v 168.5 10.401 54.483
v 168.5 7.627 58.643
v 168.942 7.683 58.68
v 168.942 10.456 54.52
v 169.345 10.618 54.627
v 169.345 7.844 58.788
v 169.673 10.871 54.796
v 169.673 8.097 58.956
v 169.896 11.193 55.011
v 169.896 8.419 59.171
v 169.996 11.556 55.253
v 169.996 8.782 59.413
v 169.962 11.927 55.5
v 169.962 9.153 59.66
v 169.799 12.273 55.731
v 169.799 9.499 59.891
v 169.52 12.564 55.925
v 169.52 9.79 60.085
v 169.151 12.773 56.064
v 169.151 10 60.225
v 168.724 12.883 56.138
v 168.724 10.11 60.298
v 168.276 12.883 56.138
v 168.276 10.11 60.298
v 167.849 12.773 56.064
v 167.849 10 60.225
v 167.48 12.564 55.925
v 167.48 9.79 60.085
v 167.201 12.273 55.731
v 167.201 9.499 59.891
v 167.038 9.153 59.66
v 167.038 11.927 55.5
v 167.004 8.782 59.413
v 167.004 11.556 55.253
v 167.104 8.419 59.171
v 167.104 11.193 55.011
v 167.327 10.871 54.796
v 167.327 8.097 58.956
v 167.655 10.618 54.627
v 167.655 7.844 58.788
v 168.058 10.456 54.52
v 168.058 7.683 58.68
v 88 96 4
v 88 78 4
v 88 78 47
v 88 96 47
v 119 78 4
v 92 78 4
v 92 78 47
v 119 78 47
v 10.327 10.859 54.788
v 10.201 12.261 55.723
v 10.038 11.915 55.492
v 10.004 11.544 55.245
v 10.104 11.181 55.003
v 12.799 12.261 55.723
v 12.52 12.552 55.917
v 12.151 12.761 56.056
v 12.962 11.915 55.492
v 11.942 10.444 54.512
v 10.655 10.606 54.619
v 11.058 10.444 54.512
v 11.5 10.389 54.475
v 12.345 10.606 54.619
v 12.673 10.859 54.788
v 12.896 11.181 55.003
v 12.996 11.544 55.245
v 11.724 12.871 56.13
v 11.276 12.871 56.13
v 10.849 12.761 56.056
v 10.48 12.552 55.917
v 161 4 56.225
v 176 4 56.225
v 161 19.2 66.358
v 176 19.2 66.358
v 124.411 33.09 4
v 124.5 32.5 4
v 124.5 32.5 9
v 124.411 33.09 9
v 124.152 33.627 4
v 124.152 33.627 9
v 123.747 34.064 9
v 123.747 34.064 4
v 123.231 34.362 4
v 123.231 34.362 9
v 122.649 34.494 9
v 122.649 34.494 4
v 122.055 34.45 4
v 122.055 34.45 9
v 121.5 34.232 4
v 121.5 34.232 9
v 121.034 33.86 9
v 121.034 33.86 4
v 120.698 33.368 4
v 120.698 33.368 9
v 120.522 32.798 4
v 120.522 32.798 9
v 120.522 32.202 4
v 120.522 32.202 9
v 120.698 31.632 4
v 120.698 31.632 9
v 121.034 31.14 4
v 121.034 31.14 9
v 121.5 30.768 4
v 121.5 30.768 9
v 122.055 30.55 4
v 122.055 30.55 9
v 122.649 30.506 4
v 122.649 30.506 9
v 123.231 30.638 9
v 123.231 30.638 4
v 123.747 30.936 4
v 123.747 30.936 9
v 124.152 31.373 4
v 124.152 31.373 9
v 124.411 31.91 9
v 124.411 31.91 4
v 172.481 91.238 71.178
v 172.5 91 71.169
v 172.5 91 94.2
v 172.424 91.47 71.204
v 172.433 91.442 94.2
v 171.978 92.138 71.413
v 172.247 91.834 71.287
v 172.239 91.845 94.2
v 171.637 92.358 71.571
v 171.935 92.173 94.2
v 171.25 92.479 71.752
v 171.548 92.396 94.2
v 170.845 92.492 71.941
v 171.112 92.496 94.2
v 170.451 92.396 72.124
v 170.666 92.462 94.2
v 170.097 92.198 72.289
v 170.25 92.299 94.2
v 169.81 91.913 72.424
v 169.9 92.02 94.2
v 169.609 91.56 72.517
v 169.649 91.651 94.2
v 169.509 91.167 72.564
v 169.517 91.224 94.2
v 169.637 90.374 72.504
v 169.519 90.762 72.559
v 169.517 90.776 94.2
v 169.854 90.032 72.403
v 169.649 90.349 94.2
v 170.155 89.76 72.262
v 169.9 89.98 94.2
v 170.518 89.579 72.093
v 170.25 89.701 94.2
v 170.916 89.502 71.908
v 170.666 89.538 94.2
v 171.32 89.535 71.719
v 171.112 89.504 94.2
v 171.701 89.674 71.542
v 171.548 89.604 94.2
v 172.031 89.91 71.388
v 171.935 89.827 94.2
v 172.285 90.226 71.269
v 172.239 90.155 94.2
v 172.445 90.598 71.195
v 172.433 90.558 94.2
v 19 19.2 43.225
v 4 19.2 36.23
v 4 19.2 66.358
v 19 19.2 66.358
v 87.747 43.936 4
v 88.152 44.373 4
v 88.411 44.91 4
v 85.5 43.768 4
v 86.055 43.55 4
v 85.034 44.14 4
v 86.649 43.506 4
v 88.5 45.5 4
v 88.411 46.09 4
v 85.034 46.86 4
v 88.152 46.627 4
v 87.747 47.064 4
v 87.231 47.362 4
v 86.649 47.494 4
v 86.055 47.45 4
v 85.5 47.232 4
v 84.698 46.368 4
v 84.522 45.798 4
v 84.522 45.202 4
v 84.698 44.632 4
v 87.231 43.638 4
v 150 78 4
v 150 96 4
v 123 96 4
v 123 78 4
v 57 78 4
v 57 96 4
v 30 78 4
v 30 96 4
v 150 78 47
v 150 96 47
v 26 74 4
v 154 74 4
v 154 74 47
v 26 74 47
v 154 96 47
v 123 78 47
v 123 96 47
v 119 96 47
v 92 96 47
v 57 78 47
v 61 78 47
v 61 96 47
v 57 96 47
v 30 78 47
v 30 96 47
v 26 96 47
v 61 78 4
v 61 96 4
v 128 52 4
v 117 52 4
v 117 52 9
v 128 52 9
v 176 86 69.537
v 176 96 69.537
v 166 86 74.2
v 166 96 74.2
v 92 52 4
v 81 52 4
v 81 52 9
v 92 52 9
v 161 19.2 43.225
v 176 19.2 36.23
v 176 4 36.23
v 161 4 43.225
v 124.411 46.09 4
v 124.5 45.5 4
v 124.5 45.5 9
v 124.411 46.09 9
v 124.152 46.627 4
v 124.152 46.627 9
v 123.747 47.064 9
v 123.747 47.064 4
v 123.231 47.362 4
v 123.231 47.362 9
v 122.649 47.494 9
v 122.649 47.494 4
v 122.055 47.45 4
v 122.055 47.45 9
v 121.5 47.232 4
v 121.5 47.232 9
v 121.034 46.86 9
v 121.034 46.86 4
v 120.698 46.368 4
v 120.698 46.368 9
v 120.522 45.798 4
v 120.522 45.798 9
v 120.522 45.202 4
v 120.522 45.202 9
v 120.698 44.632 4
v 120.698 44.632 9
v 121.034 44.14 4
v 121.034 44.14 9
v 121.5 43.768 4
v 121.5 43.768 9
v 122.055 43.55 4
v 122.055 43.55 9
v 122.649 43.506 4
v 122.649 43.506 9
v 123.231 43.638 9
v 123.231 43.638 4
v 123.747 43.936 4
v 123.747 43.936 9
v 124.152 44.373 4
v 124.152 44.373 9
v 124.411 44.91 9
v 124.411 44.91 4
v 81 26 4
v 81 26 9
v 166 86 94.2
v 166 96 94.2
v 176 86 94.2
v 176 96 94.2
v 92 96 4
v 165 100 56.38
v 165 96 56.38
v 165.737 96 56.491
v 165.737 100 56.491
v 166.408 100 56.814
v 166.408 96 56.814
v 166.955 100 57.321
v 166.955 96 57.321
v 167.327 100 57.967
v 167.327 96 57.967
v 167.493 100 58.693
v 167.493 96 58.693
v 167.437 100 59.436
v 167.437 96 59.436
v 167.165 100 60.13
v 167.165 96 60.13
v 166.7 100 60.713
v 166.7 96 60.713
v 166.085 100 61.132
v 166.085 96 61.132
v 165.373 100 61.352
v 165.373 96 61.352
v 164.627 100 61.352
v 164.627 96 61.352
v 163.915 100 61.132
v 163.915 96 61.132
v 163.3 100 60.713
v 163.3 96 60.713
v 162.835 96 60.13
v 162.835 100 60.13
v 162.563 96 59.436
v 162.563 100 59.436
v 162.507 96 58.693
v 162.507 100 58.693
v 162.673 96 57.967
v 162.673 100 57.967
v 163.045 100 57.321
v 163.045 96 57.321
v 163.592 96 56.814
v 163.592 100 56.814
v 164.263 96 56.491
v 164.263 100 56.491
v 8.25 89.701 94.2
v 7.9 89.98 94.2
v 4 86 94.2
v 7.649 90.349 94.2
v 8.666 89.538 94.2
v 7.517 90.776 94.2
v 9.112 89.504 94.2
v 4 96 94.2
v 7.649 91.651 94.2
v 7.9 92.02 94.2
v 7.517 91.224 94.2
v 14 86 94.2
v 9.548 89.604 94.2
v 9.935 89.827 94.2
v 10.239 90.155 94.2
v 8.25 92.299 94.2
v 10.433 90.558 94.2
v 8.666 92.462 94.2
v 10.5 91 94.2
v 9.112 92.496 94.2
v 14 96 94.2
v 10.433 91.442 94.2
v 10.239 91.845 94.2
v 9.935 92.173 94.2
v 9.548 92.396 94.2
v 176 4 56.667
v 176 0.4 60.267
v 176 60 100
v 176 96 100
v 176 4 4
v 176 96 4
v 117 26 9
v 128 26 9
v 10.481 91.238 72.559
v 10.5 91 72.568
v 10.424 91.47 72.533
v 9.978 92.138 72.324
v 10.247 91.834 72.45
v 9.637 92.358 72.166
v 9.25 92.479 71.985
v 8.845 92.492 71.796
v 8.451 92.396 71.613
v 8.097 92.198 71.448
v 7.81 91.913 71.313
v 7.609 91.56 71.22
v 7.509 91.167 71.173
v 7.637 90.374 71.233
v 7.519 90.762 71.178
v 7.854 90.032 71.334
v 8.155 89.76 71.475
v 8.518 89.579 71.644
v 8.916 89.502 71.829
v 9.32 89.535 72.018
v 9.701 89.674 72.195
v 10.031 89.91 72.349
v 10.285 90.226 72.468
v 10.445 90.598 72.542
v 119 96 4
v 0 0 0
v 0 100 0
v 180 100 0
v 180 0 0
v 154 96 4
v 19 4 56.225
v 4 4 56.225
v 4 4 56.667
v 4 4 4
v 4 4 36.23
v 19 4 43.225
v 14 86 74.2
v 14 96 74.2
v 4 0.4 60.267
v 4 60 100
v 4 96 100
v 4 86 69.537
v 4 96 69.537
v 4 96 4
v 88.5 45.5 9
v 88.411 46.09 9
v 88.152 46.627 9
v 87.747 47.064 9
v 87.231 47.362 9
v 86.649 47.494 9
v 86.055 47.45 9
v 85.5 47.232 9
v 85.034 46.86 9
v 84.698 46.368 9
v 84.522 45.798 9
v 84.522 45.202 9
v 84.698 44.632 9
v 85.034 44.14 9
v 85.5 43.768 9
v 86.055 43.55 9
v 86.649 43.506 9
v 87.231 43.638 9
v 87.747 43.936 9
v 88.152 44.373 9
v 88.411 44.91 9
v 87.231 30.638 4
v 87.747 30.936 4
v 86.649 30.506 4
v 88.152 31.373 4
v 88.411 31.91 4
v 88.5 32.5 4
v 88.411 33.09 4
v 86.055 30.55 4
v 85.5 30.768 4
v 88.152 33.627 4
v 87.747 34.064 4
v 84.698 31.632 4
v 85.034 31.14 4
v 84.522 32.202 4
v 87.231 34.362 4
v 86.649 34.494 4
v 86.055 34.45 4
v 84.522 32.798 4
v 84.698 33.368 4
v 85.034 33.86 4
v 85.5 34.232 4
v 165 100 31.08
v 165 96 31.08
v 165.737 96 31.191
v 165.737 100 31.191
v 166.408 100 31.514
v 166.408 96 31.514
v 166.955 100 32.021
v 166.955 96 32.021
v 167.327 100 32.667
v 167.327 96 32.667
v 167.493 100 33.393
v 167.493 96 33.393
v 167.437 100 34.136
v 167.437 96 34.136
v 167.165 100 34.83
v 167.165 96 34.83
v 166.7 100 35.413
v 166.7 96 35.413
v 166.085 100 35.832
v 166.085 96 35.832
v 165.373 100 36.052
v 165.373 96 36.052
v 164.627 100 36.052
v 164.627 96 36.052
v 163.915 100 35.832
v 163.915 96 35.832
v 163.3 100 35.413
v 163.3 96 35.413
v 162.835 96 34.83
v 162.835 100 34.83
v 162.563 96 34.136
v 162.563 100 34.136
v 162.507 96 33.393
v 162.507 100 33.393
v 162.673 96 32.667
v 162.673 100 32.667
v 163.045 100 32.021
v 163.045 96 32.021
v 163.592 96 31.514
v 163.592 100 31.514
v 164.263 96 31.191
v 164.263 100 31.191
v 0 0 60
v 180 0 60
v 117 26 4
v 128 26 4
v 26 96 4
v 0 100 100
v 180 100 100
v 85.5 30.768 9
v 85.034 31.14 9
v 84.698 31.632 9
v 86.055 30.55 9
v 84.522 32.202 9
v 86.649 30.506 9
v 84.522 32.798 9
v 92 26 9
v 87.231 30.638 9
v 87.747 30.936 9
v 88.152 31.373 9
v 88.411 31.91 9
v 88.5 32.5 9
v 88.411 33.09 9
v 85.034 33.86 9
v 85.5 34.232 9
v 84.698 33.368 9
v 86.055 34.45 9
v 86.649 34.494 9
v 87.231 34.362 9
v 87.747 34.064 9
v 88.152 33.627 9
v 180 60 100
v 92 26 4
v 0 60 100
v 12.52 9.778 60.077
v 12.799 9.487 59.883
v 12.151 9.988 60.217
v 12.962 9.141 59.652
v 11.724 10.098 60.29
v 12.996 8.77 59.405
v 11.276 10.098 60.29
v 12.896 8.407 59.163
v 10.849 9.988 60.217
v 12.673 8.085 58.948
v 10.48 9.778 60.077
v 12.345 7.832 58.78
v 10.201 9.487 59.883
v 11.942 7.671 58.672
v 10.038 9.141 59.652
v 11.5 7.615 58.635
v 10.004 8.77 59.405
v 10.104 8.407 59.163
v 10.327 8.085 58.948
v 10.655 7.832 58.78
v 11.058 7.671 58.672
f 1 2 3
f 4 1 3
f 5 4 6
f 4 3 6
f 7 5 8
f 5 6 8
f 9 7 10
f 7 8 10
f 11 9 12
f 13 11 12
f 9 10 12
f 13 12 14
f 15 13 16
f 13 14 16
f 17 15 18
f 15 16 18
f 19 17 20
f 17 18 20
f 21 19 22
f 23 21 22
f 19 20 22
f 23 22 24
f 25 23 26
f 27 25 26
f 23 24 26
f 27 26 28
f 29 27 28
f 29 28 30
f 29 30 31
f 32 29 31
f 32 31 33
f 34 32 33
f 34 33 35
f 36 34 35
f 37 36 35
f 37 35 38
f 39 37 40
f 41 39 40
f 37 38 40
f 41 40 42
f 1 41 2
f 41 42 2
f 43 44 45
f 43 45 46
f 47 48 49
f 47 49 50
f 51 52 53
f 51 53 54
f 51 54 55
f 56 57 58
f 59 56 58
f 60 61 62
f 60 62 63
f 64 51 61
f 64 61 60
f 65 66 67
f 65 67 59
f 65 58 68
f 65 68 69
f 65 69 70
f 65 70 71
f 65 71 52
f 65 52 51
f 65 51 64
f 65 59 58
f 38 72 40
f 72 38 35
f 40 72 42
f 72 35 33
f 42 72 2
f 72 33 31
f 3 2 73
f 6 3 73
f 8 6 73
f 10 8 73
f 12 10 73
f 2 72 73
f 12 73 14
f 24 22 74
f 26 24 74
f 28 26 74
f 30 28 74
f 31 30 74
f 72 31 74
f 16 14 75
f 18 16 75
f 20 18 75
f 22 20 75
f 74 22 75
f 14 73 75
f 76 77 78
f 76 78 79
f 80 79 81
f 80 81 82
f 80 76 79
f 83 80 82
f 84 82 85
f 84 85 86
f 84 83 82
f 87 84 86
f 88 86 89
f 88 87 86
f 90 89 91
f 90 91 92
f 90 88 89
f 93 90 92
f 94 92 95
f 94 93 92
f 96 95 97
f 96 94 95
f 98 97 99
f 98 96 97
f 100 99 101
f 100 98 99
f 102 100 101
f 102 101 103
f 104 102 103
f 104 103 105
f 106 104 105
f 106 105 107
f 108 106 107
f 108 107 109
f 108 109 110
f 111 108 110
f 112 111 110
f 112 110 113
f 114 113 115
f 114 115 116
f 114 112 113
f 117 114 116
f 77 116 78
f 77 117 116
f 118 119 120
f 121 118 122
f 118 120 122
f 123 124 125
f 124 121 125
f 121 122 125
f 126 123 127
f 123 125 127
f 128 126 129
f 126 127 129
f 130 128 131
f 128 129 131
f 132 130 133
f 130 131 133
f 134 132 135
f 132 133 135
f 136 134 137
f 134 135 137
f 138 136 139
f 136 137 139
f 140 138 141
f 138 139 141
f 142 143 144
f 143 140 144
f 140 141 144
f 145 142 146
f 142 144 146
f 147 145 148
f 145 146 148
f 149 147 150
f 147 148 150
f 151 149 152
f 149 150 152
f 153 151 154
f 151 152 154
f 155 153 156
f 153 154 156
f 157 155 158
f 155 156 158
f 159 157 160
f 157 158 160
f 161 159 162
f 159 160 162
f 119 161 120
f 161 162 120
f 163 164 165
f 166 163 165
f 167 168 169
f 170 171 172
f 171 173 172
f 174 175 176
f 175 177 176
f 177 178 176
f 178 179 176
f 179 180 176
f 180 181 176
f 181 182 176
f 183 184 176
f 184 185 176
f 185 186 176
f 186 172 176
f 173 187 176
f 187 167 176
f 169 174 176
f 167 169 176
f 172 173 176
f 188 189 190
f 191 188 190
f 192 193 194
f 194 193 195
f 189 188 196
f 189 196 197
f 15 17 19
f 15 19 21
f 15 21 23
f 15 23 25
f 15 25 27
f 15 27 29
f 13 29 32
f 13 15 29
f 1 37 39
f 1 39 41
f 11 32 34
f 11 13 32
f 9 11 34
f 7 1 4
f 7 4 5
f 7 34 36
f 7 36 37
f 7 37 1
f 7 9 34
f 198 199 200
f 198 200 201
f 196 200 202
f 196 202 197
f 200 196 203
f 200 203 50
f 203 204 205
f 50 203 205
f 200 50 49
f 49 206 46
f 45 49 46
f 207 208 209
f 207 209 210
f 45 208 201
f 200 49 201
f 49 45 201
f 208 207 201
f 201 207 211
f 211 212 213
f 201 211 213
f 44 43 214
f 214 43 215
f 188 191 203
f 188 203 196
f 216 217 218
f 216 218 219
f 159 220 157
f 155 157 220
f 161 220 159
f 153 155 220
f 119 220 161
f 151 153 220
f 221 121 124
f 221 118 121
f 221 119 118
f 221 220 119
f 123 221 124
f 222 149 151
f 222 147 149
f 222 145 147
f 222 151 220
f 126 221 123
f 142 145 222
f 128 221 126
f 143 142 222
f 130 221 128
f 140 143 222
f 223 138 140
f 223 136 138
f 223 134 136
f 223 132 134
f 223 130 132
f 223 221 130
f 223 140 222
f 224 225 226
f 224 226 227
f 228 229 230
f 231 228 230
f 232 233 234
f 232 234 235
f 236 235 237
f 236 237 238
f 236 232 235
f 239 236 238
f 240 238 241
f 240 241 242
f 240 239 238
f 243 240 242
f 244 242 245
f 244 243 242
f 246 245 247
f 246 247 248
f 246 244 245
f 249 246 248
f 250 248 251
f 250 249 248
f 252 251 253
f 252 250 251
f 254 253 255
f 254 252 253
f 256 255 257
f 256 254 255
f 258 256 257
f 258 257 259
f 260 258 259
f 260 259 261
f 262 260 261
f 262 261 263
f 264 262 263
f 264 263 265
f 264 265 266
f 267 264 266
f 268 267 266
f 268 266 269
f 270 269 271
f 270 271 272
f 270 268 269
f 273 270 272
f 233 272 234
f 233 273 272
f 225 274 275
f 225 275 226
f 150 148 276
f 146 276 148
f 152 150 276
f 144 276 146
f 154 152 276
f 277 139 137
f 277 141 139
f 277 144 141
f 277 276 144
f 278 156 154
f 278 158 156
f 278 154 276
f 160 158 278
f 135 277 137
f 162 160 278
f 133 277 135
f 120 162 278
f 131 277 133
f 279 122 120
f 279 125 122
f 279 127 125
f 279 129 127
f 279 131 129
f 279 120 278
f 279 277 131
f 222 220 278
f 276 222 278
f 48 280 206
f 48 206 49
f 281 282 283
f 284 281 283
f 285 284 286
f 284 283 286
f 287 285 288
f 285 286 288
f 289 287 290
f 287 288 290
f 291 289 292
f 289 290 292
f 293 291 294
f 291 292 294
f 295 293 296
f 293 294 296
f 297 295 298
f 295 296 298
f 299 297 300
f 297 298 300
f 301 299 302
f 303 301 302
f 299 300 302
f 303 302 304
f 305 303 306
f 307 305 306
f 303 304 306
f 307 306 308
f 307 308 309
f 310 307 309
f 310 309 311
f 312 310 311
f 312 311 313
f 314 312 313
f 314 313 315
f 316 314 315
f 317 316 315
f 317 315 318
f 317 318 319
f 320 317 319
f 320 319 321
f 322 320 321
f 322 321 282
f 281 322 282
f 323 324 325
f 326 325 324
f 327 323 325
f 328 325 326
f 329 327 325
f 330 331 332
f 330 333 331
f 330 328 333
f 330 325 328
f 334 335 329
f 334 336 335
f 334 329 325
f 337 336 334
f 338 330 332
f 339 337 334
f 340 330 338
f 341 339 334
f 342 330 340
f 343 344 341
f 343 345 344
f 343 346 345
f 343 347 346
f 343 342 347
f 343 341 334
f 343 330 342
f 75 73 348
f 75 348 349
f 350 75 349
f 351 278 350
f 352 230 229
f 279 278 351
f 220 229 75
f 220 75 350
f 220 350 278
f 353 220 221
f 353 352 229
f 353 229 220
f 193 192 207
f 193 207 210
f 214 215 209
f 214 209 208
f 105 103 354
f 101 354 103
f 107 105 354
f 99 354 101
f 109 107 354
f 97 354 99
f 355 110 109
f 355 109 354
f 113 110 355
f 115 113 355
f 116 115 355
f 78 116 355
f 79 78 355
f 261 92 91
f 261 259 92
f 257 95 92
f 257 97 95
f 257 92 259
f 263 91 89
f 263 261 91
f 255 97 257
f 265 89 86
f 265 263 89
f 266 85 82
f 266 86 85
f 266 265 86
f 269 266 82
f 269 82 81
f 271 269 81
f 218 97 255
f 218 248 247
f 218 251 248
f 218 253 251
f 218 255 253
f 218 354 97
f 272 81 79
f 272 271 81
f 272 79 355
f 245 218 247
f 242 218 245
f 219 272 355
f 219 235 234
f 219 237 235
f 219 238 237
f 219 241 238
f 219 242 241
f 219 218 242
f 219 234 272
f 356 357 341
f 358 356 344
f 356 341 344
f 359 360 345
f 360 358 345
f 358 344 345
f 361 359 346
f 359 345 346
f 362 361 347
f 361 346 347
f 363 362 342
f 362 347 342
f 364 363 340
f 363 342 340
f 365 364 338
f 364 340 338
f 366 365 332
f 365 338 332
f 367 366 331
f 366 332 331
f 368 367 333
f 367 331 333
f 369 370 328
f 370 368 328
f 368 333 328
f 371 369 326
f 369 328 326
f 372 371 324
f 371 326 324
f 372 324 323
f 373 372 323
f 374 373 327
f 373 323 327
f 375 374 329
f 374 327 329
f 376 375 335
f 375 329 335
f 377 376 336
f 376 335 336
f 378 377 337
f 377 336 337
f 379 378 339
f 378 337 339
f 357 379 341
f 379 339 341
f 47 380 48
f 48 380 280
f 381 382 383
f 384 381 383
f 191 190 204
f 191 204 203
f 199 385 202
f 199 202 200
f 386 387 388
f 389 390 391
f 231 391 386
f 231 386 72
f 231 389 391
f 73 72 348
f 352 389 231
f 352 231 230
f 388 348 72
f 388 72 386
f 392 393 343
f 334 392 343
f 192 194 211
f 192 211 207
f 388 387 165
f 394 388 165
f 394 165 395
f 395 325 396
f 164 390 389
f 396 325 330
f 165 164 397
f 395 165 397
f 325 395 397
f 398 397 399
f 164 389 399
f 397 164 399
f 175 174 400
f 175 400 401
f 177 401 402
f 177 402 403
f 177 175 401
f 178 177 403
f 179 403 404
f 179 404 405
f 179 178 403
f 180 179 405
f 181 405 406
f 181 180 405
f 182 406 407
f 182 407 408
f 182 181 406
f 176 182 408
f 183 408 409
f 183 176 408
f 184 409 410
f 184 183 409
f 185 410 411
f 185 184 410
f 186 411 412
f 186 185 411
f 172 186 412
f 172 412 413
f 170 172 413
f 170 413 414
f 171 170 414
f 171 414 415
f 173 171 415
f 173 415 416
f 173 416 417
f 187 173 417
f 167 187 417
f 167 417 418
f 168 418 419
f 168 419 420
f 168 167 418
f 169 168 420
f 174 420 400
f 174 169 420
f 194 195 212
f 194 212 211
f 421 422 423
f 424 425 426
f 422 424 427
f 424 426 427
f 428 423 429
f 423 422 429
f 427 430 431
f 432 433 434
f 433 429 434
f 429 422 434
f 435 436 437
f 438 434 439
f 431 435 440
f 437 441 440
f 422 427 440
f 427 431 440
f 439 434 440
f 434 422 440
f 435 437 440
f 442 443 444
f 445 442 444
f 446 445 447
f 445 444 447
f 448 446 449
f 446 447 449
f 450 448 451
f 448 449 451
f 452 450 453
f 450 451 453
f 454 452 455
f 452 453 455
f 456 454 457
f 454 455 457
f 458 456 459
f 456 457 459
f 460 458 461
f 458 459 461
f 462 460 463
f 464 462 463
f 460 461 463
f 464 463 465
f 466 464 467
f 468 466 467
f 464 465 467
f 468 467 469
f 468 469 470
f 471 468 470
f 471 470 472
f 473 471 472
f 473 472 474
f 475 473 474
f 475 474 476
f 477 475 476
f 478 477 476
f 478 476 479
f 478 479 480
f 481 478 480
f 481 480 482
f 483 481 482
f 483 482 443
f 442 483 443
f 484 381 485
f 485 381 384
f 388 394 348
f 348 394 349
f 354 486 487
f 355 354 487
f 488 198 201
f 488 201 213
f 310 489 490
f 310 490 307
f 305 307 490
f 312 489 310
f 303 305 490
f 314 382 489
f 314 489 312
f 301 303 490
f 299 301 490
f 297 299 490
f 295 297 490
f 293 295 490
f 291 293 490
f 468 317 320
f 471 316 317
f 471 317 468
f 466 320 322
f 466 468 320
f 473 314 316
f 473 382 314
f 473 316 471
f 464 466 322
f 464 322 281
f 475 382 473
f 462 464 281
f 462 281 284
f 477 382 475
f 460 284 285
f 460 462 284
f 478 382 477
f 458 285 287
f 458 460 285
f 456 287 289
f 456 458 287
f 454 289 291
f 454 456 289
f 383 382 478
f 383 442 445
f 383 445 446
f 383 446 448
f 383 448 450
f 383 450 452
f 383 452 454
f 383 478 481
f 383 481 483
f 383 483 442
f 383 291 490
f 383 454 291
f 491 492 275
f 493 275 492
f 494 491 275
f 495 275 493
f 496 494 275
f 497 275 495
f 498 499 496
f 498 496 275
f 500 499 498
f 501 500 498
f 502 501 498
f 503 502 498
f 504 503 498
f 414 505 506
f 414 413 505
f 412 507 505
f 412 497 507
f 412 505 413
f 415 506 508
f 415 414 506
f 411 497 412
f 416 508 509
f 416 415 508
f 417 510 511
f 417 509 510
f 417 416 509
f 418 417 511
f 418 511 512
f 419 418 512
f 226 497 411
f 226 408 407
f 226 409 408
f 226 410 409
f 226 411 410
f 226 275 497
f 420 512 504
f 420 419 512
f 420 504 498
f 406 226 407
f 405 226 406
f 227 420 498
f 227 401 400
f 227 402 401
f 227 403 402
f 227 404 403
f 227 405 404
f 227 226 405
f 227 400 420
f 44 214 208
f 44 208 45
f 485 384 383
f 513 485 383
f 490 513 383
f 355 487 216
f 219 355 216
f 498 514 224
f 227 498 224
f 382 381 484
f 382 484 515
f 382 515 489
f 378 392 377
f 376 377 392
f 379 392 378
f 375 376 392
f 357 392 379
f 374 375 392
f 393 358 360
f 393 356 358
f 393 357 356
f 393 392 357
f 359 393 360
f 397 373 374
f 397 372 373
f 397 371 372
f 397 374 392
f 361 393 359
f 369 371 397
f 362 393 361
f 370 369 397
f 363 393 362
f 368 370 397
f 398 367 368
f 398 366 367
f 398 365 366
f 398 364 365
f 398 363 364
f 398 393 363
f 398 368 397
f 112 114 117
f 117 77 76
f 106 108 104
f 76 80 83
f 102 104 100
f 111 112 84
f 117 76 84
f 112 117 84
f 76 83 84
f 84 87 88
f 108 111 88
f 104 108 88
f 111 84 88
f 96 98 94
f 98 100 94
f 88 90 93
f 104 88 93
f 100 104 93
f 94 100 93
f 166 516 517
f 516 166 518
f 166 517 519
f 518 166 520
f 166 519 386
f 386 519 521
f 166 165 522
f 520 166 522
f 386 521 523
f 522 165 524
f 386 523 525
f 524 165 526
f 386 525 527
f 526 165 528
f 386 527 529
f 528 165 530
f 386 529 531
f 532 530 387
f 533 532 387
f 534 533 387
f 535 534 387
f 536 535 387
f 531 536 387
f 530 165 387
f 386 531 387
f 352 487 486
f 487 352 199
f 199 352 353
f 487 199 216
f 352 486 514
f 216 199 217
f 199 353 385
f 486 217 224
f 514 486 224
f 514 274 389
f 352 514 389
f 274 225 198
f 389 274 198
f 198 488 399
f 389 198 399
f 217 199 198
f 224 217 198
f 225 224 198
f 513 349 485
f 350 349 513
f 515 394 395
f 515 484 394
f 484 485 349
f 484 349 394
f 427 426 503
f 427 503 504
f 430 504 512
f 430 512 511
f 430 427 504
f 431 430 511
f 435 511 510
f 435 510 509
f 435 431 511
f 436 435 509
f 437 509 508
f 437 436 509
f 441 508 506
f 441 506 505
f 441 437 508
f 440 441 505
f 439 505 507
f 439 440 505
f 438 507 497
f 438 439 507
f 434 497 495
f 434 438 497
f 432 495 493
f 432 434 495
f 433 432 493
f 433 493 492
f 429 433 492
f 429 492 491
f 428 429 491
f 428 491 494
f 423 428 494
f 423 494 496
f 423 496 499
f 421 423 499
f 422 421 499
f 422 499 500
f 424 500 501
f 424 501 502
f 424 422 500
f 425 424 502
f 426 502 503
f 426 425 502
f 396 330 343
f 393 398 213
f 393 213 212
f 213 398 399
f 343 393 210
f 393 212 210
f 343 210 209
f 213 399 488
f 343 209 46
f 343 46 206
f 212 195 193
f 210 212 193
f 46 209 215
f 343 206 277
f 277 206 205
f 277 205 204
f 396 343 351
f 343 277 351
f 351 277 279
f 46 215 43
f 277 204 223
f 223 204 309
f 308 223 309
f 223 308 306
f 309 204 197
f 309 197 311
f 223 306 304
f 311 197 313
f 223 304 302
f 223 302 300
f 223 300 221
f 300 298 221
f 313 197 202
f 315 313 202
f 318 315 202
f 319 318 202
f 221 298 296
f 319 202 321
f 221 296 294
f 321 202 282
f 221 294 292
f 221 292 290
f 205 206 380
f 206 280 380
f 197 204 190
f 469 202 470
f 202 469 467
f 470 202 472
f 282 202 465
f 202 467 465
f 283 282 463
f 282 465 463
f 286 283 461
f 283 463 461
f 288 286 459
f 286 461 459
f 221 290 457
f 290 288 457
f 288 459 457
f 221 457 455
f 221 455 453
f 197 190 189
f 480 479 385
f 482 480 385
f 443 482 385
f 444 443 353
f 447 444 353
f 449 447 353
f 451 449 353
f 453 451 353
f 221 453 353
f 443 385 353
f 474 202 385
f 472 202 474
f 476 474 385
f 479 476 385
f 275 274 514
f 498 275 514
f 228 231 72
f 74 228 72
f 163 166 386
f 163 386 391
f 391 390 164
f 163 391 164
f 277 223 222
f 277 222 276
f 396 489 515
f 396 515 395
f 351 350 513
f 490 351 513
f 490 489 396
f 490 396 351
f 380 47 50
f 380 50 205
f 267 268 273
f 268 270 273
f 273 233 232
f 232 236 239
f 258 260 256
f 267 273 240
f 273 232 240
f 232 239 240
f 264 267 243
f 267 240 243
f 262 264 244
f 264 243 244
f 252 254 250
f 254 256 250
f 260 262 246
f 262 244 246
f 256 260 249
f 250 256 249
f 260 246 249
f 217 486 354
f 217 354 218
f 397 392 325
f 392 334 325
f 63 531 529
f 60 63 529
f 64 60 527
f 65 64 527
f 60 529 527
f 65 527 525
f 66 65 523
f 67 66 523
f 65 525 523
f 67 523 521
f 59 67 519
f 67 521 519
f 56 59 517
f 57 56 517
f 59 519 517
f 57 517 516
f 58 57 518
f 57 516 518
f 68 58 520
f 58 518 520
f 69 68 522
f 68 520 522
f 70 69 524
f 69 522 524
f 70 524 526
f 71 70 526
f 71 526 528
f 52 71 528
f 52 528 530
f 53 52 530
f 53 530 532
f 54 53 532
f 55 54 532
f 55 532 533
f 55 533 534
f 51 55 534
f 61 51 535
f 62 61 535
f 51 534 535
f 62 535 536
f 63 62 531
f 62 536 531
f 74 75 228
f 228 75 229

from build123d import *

# Parameters (mm, degrees)
ESBO_O1_W                = 180
ESBO_O1_H                = 100
ESBO_O1_W_2              = 172
ESBO_O1_H_2              = 92
RESSALTO_EXTRUS_O1_DEPTH = 100
ESBO_O2_W                = 180
ESBO_O2_H                = 100
RESSALTO_EXTRUS_O2_DEPTH = 4
RESSALTO_EXTRUS_O3_DEPTH = 43
CORTE_EXTRUS_O1_DEPTH    = 263
CHANFRO1_SIZE            = 6
CHANFRO1_SIZE2           = 4.326661531
ESBO_O5_W                = 10
ESBO_O5_H                = 20
RESSALTO_EXTRUS_O4_DEPTH = 10
ESBO_O6_R                = 1.5
CORTE_EXTRUS_O2_DEPTH    = 32
ESBO_O7_R                = 2.5
CORTE_EXTRUS_O3_DEPTH    = 32
CHANFRO3_SIZE            = 4.663076582
CHANFRO3_SIZE_2          = 10
CHANFRO4_SIZE            = 10
CHANFRO4_SIZE_2          = 4.663076582
RESSALTO_EXTRUS_O5_DEPTH = 15
RESSALTO_EXTRUS_O6_DEPTH = 15
CHANFRO5_SIZE2           = 15
CHANFRO5_SIZE            = 6.994614872
CHANFRO6_SIZE2           = 15
CHANFRO6_SIZE            = 6.994614872
ESBO_O10_R               = 1.5
CORTE_EXTRUS_O4_DEPTH    = 5
ESBO_O11_W               = 11
ESBO_O11_H               = 26
ESBO_O11_R               = 2
RESSALTO_EXTRUS_O7_DEPTH = 5


# Some blends are built 0.0001 mm under size
with BuildPart() as part:
    # Esboço1 → Ressalto-extrusão1 (new body)
    with BuildSketch(Plane.XY):
        with Locations((90, 50)):
            Rectangle(ESBO_O1_W, ESBO_O1_H)
        with Locations((90, 50)):
            Rectangle(ESBO_O1_W_2, ESBO_O1_H_2, mode=Mode.SUBTRACT)
    extrude(amount=RESSALTO_EXTRUS_O1_DEPTH)

    # Esboço2 → Ressalto-extrusão2 (add)
    with BuildSketch(Plane(origin=(0, 0, 0), x_dir=(-1, 0, 0), z_dir=(0, 0, -1))):
        with Locations((-90, 50)):
            Rectangle(ESBO_O2_W, ESBO_O2_H)
    extrude(amount=-RESSALTO_EXTRUS_O2_DEPTH)

    # Esboço3 → Ressalto-extrusão3 (add)
    with BuildSketch(Plane.XY.offset(4)):
        Polygon((30, 96), (30, 78), (57, 78), (57, 96), (61, 96), (61, 78), (88, 78), (88, 96), (92, 96), (92, 78), (119, 78), (119, 96), (123, 96), (123, 78), (150, 78), (150, 96), (154, 96), (154, 74), (26, 74), (26, 96), align=None)
    extrude(amount=RESSALTO_EXTRUS_O3_DEPTH)

    # Esboço4 → Corte-extrusão1 (cut)
    with BuildSketch(Plane.ZY):
        Polygon((60, 0), (100, 60), (100, 0), align=None)
    extrude(amount=-CORTE_EXTRUS_O1_DEPTH, mode=Mode.SUBTRACT)

    # Chanfro1
    chanfro1_edges = [part.edges().sort_by_distance(p)[0] for p in [
        (90, 4, 62.666666667),
    ]]
    chanfro1_side = [part.faces().sort_by_distance(p)[0] for p in [
        (90, 4, 33.333333333),
    ]]
    chamfer(chanfro1_edges, length=CHANFRO1_SIZE, length2=CHANFRO1_SIZE2, reference=chanfro1_side[0])

    # Esboço5 → Ressalto-extrusão4 (add)
    with BuildSketch(Plane.XZ.offset(-96)):
        with Locations((9, 84.2)):
            Rectangle(ESBO_O5_W, ESBO_O5_H)
        with Locations((171, 84.2)):
            Rectangle(ESBO_O5_W, ESBO_O5_H)
    extrude(amount=RESSALTO_EXTRUS_O4_DEPTH)

    # Esboço6 → Corte-extrusão2 (cut)
    with BuildSketch(Plane.XY.offset(94.2)):
        with Locations((171, 91)):
            Circle(ESBO_O6_R)
        with Locations((9, 91)):
            Circle(ESBO_O6_R)
    extrude(amount=-CORTE_EXTRUS_O2_DEPTH, mode=Mode.SUBTRACT)

    # Esboço7 → Corte-extrusão3 (cut)
    with BuildSketch(Plane.XZ.offset(-96)):
        with Locations(Location((165, 58.88, 0), (0, 0, 270))):
            Circle(ESBO_O7_R)
        with Locations(Location((165, 33.58, 0), (0, 0, 270))):
            Circle(ESBO_O7_R)
    extrude(amount=-CORTE_EXTRUS_O3_DEPTH, mode=Mode.SUBTRACT)

    # Chanfro3
    # the kernel refuses this chamfer: 10, 4.663076582 mm, written as the material it adds along each edge
    with BuildSketch(Plane(origin=(176, 96, 74.2), x_dir=(0.07481330637059742, 0, -0.9971975577536776), z_dir=(0, -1, 0))) as chanfro3_piece_1_section:
        Polygon((CHANFRO3_SIZE * 0.997197557657, -CHANFRO3_SIZE * 0.0748133063634), (-CHANFRO3_SIZE_2 * 0.0748133063706, -CHANFRO3_SIZE_2 * 0.997197557754), (0, 0), align=None)
    chanfro3_piece_1 = extrude(amount=10, mode=Mode.PRIVATE)
    chanfro3_piece_1 = split(chanfro3_piece_1, bisect_by=Plane(origin=(166, 91.000000816, 72.695597538), z_dir=(1, 0, 0)), keep=Keep.TOP, mode=Mode.PRIVATE)
    chanfro3_piece_1 = chanfro3_piece_1 - Plane(origin=(171, 91, 72.695597538), x_dir=(1, 0, 0), z_dir=(0, 0, 1)) * Cylinder(1.5, 60, mode=Mode.PRIVATE)
    add(chanfro3_piece_1)

    # Chanfro4
    # the kernel refuses this chamfer: 10, 4.663076582 mm, written as the material it adds along each edge
    with BuildSketch(Plane(origin=(4, 96, 74.2), x_dir=(0.9998669641130704, 0, 0.01631116413111014), z_dir=(0, -1, 0))) as chanfro4_piece_1_section:
        Polygon((CHANFRO4_SIZE * 0.999866964113, -CHANFRO4_SIZE * 0.0163111641311), (-CHANFRO4_SIZE_2 * 0.0163111641295, -CHANFRO4_SIZE_2 * 0.999866964017), (0, 0), align=None)
    chanfro4_piece_1 = extrude(amount=10, mode=Mode.PRIVATE)
    chanfro4_piece_1 = chanfro4_piece_1 - Plane(origin=(9, 91, 72.695597727), x_dir=(1, 0, 0), z_dir=(0, 0, 1)) * Cylinder(1.5, 60, mode=Mode.PRIVATE)
    chanfro4_piece_1 = split(chanfro4_piece_1, bisect_by=Plane(origin=(14, 91.000000829, 72.695597727), z_dir=(-1, 0, 0)), keep=Keep.TOP, mode=Mode.PRIVATE)
    add(chanfro4_piece_1)

    # Esboço8 → Ressalto-extrusão5 (add)
    with BuildSketch(Plane.ZY.offset(-176)):
        Polygon((56.224748388, 4), (66.358081721, 19.2), (43.224748388, 19.2), (43.224748388, 4), align=None)
    extrude(amount=RESSALTO_EXTRUS_O5_DEPTH)

    # Esboço9 → Ressalto-extrusão6 (add)
    with BuildSketch(Plane(origin=(4, 0, 0), x_dir=(0, 0, -1), z_dir=(1, 0, 0))):
        Polygon((-43.224748388, 19.2), (-66.358081721, 19.2), (-56.224748388, 4), (-43.224748388, 4), align=None)
    extrude(amount=RESSALTO_EXTRUS_O6_DEPTH)

    # Chanfro5
    chanfro5_edges = [part.edges().sort_by_distance(p)[0] for p in [
        (176, 11.6, 43.224748388),
    ]]
    chanfro5_side = [part.faces().sort_by_distance(p)[0] for p in [
        (176, 11.6, 43.08485609),
    ]]
    chamfer(chanfro5_edges, length=CHANFRO5_SIZE - 0.0001, length2=CHANFRO5_SIZE2 - 0.0001, reference=chanfro5_side[0])  # a hair under: the kernel refuses the full size

    # Chanfro6
    chanfro6_edges = [part.edges().sort_by_distance(p)[0] for p in [
        (4, 11.6, 43.224748388),
    ]]
    chanfro6_side = [part.faces().sort_by_distance(p)[0] for p in [
        (4, 11.6, 43.08485609),
    ]]
    chamfer(chanfro6_edges, length=CHANFRO6_SIZE - 0.0001, length2=CHANFRO6_SIZE2 - 0.0001, reference=chanfro6_side[0])  # a hair under: the kernel refuses the full size

    # Esboço10 → Corte-extrusão4 (cut)
    with BuildSketch(Plane(origin=(0, -24.719114641, 37.078671961), x_dir=(1, 0, 0), z_dir=(0, -0.5547001962252299, 0.8320502943378433))):
        with Locations(Location((11.5, 40.361212297, 0), (0, 0, 270))):
            Circle(ESBO_O10_R)
        with Locations(Location((168.5, 40.375568889, 0), (0, 0, 270))):
            Circle(ESBO_O10_R)
    extrude(amount=-CORTE_EXTRUS_O4_DEPTH, mode=Mode.SUBTRACT)

    # Esboço11 → Ressalto-extrusão7 (add)
    # profile 1 of 2: a face of its own
    with BuildSketch(Plane.XY.offset(4)):
        with Locations((122.5, 39)):
            Rectangle(ESBO_O11_W, ESBO_O11_H)
        with Locations((122.5, 45.5)):
            Circle(ESBO_O11_R, mode=Mode.SUBTRACT)
        with Locations((122.5, 32.5)):
            Circle(ESBO_O11_R, mode=Mode.SUBTRACT)
    # profile 2 of 2: a face of its own
    with BuildSketch(Plane.XY.offset(4)):
        with Locations((86.5, 39)):
            Rectangle(ESBO_O11_W, ESBO_O11_H)
        with Locations((86.5, 45.5)):
            Circle(ESBO_O11_R, mode=Mode.SUBTRACT)
        with Locations((86.5, 32.5)):
            Circle(ESBO_O11_R, mode=Mode.SUBTRACT)
    extrude(amount=RESSALTO_EXTRUS_O7_DEPTH)


solid = part.part
